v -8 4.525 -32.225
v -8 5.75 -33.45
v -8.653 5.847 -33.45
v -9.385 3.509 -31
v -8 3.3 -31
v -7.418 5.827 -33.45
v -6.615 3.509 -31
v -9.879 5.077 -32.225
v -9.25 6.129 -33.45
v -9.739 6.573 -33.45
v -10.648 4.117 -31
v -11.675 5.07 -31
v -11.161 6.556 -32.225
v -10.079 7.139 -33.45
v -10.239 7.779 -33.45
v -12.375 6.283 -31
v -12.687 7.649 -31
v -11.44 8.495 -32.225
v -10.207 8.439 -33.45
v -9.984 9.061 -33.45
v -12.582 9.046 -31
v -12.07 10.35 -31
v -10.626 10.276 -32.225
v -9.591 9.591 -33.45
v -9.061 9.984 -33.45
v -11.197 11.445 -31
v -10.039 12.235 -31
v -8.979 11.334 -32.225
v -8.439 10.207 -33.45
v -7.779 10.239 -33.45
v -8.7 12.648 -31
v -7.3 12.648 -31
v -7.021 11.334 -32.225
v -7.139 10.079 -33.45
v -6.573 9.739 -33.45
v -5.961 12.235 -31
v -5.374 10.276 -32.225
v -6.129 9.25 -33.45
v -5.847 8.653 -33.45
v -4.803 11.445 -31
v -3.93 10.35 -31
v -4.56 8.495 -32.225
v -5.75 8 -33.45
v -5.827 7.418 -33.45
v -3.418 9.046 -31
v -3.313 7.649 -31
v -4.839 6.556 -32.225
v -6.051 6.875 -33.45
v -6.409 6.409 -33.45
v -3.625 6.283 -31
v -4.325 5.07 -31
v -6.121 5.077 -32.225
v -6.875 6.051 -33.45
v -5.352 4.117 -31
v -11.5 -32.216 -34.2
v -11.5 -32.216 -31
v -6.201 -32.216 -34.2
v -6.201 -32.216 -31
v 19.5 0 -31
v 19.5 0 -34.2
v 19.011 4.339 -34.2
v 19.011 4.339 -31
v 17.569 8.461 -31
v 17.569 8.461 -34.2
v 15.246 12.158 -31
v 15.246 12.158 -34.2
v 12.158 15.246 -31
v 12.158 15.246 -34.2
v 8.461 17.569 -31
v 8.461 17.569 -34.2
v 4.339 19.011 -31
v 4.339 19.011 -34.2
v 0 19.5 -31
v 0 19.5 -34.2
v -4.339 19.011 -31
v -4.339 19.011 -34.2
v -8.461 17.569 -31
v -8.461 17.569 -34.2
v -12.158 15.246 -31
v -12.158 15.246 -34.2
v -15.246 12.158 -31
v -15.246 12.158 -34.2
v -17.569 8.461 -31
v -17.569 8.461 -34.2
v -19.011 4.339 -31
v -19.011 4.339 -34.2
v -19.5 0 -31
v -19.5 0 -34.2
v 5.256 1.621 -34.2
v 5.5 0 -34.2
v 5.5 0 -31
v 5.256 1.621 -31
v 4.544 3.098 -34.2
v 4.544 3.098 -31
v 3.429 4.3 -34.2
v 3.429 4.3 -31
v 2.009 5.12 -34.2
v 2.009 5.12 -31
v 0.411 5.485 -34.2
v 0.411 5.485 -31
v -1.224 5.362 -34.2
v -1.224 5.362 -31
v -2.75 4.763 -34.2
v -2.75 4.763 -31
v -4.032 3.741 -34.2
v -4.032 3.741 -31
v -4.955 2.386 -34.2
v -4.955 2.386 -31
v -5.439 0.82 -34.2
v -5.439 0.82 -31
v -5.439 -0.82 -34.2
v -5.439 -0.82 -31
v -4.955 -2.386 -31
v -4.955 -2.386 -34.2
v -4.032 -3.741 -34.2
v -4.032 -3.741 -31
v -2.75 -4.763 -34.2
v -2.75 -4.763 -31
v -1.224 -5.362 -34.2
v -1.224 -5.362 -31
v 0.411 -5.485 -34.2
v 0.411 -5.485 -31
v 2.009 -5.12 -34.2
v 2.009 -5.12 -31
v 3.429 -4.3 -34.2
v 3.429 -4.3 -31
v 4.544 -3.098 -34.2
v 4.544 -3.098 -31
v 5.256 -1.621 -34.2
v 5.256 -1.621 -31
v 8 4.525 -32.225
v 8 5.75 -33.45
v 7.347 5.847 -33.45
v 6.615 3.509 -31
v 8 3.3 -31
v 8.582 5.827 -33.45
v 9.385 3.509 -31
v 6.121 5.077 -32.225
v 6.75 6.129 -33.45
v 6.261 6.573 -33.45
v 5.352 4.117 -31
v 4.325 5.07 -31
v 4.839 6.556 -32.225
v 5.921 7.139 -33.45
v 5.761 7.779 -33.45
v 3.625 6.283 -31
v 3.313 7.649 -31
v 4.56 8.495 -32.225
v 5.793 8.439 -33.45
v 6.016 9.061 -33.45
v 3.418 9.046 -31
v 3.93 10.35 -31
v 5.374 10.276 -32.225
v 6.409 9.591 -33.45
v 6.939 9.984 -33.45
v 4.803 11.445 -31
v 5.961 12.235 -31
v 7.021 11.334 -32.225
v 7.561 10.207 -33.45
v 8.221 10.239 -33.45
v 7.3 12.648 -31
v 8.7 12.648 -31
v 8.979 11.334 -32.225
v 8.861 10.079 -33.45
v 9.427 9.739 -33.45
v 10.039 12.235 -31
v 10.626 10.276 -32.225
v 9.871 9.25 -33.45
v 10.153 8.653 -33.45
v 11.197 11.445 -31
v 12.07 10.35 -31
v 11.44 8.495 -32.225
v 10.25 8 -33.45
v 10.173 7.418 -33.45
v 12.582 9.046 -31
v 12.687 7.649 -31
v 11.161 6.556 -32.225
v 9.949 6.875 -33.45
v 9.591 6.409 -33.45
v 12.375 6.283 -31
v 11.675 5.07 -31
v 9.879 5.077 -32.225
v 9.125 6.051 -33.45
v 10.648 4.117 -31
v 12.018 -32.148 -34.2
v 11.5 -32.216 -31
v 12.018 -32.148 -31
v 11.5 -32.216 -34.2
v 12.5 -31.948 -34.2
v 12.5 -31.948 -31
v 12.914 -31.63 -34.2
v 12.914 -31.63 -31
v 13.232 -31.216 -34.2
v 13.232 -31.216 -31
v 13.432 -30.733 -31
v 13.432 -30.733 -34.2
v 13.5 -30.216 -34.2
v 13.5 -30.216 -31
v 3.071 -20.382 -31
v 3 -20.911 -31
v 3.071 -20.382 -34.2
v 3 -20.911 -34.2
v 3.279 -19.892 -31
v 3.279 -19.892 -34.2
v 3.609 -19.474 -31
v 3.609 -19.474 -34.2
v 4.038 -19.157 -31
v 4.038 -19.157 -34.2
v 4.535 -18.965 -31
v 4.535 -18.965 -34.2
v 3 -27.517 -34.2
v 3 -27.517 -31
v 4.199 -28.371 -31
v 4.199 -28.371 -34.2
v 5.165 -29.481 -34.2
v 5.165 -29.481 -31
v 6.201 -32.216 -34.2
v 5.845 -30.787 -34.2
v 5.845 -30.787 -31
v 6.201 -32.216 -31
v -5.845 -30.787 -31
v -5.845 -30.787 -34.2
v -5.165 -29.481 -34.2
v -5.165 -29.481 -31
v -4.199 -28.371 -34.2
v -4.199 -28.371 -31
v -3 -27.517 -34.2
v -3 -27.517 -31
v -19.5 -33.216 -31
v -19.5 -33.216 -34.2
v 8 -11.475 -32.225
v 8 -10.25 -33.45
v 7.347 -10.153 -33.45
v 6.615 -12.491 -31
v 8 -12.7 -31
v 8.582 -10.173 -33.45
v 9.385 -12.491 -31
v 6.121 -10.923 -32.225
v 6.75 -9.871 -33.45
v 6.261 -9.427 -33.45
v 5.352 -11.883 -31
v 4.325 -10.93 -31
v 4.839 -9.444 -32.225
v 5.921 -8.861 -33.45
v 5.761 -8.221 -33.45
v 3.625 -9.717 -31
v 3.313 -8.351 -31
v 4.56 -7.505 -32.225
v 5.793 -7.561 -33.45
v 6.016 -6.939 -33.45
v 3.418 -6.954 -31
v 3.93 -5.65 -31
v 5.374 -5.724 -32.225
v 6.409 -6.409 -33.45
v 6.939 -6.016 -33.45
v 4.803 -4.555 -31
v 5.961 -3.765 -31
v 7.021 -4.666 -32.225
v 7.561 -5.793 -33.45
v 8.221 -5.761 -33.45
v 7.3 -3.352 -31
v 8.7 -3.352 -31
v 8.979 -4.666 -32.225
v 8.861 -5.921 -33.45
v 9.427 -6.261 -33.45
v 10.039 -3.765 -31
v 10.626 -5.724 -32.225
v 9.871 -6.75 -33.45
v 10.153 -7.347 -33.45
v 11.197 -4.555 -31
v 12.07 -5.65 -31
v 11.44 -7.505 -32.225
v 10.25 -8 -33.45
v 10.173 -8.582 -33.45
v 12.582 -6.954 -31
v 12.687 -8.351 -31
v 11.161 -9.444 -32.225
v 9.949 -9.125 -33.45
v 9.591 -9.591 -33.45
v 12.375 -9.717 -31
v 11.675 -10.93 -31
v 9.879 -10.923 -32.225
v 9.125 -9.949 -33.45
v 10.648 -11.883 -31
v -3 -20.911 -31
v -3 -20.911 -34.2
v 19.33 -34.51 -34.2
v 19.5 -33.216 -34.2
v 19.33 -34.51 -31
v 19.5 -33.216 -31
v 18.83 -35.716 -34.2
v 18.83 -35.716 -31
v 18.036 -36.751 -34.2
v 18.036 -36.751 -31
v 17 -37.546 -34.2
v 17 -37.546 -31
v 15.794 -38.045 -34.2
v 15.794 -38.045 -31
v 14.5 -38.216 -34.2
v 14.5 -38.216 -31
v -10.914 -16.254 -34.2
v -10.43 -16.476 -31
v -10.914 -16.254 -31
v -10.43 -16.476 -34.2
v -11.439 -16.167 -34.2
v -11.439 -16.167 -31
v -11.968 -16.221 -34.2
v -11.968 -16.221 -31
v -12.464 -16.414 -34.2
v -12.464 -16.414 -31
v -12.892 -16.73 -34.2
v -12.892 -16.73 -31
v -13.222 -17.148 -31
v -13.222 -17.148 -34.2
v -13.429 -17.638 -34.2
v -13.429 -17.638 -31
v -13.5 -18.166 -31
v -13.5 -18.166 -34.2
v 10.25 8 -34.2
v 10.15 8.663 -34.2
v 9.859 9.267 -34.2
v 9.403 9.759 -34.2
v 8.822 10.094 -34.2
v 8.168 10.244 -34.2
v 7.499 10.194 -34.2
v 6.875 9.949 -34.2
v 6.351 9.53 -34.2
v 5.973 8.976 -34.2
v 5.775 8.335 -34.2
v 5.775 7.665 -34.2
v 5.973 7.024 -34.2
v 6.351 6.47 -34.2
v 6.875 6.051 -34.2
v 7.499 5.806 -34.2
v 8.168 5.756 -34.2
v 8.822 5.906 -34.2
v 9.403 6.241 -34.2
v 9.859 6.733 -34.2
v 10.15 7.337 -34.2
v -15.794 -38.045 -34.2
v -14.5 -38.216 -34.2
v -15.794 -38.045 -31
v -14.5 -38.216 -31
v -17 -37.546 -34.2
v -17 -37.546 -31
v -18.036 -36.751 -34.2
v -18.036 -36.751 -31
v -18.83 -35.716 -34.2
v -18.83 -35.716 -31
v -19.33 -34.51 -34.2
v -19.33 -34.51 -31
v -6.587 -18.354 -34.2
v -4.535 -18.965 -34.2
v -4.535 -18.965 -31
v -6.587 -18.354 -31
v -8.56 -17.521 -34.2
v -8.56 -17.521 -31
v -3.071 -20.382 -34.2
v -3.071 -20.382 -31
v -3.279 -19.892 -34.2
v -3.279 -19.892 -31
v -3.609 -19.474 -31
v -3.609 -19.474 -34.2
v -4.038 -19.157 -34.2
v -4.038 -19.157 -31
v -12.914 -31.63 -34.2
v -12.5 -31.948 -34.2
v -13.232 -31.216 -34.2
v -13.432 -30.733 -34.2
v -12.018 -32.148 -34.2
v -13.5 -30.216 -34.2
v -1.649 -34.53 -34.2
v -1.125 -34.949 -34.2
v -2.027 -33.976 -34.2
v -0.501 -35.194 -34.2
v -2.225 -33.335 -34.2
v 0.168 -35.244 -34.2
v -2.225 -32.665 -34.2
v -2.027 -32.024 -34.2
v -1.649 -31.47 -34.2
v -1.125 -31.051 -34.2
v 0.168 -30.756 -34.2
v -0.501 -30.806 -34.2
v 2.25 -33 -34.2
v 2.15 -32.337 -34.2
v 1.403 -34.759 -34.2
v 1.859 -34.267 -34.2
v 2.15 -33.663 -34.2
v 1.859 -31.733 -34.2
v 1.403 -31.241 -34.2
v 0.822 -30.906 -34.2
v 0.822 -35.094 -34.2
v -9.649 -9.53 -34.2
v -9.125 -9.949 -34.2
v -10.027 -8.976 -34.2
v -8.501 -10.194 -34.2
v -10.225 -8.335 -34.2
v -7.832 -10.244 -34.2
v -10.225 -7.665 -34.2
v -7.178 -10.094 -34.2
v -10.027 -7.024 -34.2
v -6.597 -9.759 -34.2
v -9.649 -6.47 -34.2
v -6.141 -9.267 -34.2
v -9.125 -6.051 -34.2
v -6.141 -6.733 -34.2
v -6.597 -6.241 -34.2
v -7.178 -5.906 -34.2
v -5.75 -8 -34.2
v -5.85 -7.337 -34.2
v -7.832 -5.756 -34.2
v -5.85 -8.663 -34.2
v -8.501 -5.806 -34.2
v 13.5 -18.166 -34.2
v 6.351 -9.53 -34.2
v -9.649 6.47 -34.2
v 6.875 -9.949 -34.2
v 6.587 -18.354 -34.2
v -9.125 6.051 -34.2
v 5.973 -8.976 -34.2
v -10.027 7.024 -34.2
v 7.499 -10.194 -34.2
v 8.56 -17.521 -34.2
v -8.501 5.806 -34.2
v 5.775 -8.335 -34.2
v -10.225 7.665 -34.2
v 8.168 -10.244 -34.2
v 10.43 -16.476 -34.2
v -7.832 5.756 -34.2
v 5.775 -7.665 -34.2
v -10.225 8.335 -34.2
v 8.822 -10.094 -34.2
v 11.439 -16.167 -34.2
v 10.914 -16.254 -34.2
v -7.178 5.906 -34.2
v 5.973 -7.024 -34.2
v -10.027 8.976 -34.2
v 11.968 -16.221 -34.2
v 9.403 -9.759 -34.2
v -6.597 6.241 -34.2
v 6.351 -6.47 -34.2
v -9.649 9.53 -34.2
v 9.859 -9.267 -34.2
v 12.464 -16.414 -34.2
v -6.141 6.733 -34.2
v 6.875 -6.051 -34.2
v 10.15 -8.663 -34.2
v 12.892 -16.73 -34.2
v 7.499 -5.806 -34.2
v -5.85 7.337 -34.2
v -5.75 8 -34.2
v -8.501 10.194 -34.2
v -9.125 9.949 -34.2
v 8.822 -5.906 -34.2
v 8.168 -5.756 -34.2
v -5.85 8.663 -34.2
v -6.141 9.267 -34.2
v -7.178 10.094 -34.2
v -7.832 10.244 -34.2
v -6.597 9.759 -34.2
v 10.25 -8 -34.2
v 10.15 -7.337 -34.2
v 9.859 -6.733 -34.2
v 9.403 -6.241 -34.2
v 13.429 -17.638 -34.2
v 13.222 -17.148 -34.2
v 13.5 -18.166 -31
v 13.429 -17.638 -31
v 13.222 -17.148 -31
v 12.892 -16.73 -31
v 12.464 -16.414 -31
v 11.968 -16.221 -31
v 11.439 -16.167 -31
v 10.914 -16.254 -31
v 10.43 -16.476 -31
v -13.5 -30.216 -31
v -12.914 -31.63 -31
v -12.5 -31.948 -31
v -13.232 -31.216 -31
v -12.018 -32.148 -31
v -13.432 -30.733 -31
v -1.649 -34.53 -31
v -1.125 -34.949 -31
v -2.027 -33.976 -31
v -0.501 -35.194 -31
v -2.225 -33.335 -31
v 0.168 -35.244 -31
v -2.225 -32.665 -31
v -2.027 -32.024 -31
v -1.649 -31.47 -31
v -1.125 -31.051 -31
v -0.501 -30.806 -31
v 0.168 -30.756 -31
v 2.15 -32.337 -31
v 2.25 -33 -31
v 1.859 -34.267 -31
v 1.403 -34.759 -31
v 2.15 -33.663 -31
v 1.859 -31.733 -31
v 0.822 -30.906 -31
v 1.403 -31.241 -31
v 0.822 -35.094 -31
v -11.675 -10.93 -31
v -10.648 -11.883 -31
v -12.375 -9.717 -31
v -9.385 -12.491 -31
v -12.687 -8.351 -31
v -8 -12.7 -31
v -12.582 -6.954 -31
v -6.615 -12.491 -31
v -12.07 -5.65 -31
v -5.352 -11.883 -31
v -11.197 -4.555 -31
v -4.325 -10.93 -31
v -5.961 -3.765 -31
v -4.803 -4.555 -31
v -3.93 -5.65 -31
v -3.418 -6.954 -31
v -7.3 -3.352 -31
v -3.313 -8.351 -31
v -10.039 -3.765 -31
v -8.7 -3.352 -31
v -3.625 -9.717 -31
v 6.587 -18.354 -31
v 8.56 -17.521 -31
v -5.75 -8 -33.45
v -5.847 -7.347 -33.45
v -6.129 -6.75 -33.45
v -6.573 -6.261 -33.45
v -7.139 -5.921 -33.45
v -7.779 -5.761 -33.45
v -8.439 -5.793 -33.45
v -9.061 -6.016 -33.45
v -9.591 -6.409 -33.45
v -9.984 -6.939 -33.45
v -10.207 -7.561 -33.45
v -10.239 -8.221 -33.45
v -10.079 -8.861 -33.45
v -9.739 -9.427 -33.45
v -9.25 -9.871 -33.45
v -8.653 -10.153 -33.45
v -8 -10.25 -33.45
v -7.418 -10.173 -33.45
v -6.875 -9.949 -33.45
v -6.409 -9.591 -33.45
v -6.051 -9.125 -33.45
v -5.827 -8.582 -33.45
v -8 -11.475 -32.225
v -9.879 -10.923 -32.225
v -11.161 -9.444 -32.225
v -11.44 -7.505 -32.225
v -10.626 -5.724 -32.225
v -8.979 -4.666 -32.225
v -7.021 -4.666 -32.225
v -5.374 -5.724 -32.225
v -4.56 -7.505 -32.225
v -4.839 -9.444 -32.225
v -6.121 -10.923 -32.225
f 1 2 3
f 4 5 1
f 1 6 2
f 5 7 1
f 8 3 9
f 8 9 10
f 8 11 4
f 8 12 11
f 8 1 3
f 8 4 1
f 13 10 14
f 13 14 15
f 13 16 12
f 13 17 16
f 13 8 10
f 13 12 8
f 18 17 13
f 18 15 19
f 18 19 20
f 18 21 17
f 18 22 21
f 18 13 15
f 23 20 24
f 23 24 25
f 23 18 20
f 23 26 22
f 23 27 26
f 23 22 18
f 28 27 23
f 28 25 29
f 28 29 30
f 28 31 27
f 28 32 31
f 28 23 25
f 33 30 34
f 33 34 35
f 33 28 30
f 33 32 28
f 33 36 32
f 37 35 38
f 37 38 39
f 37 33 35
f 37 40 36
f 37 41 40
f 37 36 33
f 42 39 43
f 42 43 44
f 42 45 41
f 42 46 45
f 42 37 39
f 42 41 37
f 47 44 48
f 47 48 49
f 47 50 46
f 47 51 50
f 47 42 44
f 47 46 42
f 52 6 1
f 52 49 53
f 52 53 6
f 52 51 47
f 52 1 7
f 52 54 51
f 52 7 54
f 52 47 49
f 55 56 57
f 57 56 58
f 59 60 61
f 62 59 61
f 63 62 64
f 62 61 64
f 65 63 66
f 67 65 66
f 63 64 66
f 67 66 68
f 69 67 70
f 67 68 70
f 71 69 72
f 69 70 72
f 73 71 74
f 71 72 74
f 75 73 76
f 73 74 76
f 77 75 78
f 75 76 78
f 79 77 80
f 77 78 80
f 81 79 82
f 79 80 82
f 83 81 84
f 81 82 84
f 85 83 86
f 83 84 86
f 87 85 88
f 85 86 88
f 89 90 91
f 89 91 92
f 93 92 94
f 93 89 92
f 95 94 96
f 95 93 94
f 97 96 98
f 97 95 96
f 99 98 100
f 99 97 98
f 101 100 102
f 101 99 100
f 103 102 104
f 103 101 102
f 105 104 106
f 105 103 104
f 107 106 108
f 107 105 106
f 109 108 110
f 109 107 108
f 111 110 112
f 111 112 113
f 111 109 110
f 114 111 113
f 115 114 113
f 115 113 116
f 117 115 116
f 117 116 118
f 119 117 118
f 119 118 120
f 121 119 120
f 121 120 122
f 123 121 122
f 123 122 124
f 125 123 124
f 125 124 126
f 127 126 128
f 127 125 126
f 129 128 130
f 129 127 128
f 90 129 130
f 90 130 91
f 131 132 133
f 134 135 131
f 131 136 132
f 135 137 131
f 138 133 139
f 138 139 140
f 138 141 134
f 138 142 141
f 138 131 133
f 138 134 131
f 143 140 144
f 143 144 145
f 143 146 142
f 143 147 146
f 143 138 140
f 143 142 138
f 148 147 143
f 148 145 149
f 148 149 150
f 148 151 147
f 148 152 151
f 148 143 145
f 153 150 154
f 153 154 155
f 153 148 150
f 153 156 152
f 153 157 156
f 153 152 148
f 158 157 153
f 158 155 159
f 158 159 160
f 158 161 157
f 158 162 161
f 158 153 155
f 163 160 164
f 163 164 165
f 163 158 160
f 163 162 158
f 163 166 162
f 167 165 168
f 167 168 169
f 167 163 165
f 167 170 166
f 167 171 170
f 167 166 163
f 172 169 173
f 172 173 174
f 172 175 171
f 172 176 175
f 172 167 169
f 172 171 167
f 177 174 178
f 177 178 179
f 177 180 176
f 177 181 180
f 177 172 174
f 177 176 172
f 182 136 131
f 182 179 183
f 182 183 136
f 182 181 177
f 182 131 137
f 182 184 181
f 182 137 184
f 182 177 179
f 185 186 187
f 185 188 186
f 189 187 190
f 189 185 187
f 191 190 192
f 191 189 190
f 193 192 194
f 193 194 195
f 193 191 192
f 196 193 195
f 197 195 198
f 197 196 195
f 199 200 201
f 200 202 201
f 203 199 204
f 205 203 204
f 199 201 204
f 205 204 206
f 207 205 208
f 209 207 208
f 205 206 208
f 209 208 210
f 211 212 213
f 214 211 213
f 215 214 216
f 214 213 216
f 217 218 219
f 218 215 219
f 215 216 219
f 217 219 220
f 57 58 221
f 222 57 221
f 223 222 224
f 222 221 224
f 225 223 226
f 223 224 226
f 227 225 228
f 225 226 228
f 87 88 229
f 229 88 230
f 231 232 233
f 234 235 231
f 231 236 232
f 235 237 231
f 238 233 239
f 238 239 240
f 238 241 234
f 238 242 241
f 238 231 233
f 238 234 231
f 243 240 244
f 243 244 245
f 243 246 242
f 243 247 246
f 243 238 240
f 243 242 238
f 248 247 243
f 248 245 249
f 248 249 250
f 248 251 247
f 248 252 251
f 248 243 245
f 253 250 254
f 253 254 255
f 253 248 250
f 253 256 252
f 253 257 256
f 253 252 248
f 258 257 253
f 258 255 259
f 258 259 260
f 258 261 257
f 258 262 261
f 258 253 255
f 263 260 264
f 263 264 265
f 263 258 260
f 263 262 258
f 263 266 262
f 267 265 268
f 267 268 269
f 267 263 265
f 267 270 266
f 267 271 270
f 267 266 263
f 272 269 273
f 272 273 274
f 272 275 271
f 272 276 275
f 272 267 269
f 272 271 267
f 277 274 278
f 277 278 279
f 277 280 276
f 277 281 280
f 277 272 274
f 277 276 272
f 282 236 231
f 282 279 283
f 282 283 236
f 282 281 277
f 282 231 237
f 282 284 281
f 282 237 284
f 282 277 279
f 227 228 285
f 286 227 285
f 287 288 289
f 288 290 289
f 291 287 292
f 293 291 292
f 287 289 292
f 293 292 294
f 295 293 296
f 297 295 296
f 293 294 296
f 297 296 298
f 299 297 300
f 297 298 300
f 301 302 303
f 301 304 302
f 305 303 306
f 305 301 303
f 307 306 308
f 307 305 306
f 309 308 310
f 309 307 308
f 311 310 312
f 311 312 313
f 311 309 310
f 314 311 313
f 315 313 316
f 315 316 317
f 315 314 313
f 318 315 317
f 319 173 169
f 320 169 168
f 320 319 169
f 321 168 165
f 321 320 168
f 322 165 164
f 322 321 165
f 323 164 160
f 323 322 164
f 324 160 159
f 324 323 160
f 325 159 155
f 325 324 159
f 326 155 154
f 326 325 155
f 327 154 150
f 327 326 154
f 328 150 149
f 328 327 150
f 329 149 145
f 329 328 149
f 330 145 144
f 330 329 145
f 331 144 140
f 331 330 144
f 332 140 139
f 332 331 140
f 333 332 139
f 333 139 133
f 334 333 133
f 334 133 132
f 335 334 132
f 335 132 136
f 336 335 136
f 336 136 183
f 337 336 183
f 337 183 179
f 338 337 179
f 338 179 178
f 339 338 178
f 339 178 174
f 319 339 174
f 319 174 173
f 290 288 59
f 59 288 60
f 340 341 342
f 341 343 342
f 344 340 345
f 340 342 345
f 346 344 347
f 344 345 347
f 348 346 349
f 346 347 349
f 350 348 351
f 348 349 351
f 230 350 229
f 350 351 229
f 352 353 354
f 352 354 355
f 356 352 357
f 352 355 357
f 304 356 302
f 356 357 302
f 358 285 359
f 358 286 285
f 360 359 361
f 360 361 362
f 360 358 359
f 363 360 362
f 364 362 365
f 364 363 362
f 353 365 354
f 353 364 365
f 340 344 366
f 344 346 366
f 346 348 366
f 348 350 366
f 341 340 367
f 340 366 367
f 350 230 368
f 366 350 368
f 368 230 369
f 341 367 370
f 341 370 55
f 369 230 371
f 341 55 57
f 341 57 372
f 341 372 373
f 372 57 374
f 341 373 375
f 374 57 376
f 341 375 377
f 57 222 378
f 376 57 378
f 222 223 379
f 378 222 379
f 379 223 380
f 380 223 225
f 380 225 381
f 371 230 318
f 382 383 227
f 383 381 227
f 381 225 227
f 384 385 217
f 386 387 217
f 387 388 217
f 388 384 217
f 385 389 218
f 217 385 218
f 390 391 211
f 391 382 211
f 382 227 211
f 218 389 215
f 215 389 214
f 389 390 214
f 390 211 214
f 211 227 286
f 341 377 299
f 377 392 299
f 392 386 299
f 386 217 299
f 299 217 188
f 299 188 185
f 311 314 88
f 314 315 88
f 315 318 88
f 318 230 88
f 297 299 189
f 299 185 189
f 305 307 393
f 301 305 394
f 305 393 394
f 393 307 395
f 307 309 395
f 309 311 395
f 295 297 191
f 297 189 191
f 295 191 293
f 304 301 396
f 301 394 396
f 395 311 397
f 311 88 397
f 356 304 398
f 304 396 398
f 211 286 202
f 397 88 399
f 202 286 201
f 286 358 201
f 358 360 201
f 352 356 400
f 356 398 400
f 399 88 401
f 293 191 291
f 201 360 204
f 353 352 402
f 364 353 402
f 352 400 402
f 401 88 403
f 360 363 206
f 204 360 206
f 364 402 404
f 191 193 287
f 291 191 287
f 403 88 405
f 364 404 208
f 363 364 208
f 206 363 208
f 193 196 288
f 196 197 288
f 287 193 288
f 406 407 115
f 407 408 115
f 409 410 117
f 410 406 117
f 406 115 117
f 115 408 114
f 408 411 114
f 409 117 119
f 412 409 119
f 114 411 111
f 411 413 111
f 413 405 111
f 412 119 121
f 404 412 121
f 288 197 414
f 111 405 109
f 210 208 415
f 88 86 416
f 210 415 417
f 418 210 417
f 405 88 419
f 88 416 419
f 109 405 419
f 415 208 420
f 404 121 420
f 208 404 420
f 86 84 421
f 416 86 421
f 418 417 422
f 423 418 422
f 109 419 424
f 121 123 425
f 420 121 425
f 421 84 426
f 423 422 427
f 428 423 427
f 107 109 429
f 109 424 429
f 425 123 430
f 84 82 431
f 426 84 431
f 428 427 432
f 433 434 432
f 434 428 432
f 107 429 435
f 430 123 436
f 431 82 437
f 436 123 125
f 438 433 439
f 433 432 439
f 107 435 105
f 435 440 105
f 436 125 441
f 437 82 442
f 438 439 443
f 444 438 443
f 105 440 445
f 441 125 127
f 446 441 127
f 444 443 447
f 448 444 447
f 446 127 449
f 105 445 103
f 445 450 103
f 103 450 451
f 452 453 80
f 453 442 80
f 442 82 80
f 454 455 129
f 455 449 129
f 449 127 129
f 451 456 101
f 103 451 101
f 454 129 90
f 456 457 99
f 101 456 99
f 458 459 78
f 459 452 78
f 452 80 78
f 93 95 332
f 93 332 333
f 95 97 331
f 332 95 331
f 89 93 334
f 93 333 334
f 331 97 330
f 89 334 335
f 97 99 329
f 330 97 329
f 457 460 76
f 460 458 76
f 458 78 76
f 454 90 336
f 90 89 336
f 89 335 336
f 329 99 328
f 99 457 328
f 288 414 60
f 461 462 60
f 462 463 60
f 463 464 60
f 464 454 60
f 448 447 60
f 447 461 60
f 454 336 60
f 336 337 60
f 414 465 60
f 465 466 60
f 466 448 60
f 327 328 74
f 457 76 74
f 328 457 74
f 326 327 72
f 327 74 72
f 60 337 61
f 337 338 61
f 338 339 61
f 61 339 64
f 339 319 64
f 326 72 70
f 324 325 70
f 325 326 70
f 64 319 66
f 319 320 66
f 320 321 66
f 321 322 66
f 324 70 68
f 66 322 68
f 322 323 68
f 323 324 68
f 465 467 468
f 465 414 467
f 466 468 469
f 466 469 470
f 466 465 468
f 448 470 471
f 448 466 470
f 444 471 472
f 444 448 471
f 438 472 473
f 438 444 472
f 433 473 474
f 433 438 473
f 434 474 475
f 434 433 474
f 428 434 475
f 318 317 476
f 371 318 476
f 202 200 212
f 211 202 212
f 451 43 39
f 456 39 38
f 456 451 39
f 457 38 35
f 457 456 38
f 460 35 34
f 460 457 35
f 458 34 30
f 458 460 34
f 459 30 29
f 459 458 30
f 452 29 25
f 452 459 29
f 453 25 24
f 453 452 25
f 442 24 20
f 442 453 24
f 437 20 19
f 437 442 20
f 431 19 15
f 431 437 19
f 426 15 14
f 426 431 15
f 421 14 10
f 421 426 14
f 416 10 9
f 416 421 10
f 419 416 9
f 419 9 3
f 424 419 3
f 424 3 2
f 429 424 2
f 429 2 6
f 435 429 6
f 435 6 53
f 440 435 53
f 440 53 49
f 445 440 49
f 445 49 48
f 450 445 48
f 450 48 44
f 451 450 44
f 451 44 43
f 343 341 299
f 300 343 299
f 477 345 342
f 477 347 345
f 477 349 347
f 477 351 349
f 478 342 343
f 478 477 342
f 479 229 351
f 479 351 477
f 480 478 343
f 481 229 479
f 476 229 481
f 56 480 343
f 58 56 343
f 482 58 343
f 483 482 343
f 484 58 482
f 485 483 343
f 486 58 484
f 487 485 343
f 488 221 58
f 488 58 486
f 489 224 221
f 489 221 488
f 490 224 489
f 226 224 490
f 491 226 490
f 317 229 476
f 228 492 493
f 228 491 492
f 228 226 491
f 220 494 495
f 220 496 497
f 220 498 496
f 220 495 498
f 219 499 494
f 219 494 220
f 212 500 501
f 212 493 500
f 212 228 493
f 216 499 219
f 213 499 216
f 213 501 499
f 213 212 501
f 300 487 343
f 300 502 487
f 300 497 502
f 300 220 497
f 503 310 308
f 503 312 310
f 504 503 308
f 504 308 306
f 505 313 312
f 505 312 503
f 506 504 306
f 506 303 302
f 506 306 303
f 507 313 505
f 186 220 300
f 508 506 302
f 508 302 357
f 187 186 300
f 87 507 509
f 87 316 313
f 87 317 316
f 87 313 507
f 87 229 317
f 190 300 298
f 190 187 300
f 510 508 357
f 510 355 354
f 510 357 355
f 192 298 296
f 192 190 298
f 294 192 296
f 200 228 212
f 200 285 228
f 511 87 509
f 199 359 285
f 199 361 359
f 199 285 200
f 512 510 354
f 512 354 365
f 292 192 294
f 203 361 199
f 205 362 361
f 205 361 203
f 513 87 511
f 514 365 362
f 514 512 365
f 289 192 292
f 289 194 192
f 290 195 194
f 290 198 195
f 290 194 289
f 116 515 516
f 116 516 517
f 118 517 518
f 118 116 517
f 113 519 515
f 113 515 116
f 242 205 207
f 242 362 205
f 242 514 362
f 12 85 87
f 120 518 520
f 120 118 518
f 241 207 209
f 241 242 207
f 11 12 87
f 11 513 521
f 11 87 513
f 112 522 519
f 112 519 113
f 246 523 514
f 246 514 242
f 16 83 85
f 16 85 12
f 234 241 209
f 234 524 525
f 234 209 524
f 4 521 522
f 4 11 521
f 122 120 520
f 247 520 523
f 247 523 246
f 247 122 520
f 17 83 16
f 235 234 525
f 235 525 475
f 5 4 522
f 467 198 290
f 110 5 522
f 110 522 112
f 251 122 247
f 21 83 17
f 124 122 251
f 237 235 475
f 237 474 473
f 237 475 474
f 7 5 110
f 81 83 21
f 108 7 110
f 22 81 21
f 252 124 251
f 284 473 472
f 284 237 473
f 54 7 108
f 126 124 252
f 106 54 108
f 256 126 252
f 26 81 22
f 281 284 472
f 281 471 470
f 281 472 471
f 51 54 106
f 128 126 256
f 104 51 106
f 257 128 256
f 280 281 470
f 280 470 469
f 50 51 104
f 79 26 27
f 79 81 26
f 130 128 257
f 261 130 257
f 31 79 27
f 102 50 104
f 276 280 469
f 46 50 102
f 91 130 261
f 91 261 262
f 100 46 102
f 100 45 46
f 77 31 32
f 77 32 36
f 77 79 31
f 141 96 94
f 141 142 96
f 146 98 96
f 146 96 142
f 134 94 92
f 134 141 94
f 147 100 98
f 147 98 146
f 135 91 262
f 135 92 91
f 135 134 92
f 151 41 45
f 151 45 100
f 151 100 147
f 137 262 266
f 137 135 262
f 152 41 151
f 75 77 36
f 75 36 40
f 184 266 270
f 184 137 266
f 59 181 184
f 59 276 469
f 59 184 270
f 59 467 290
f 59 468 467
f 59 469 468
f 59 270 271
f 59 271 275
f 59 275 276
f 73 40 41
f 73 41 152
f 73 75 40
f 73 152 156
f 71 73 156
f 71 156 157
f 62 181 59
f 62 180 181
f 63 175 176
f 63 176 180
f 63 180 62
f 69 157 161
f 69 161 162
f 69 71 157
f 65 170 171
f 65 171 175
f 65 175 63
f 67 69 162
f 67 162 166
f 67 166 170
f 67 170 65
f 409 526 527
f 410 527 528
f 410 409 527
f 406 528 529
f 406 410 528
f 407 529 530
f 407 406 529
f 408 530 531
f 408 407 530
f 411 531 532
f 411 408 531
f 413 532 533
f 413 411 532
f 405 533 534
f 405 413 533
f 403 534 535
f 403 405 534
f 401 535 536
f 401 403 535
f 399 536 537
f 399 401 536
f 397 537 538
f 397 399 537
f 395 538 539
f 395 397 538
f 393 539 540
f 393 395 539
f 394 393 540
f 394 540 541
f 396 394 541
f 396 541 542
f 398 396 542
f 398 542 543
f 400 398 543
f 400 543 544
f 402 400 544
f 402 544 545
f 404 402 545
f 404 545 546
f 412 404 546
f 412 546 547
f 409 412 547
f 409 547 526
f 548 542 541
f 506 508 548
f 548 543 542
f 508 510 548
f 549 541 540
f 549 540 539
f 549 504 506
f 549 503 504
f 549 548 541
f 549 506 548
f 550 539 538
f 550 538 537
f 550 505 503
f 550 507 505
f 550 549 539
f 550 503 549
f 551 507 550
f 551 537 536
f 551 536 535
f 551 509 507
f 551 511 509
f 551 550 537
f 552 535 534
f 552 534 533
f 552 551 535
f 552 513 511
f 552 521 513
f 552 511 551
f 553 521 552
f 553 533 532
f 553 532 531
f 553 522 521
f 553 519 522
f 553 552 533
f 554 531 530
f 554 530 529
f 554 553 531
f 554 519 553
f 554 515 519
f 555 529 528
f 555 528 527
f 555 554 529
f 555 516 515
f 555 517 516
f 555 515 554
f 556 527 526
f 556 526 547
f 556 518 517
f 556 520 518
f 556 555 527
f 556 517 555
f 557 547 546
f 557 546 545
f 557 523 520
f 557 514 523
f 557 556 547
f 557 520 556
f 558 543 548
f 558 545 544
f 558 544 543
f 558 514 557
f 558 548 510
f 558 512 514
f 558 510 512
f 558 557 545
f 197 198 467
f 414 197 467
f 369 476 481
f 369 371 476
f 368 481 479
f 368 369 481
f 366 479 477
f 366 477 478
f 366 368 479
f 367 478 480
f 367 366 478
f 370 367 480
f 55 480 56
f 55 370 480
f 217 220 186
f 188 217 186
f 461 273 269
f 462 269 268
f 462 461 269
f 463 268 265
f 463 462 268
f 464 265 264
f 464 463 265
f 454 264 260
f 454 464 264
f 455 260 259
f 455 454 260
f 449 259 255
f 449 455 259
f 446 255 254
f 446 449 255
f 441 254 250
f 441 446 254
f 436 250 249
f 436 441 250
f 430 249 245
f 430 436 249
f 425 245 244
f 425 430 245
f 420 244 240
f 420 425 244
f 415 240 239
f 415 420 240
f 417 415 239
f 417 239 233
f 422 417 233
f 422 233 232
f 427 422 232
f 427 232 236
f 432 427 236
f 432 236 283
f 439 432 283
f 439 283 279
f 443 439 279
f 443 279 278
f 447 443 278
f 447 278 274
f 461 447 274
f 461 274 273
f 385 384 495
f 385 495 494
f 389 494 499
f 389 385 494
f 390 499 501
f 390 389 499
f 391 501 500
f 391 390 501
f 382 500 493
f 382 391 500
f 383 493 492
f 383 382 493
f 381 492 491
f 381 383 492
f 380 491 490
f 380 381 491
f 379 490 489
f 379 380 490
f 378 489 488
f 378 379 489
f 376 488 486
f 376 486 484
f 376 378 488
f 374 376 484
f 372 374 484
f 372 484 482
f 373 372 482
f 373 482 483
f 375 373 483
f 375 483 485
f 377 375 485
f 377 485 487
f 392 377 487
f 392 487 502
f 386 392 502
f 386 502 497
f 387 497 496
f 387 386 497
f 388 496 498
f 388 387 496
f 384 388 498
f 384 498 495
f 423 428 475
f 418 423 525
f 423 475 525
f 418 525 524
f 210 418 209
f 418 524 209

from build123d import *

# Parameters (mm, degrees)
STOCK_SPINE_MASTER_1_START                   = -34.2
STOCK_SPINE_MASTER_1_OUTLINE_R               = 2.25
STOCK_SPINE_MASTER_1_OUTLINE_R_2             = 5.5
STOCK_SPINE_MASTER_1_DEPTH                   = 3.2
FILLET1_R                                    = 5
CUT_EXTRUDE2_DEPTH                           = 44.022458369
FILLET2_R                                    = 2
CSK_FOR_M4_COUNTERSUNK_FLAT_HEAD_SCR_2_COUNT = 2
CSK_FOR_M4_COUNTERSUNK_FLAT_HEAD_SCR_2_PITCH = 16
CSK_FOR_M4_COUNTERSUNK_FLAT_HEAD_SCR_3_COUNT = 2
CSK_FOR_M4_COUNTERSUNK_FLAT_HEAD_SCR_3_PITCH = 22.627416998
CSK_FOR_M4_COUNTERSUNK_FLAT_HEAD_SCR_4_COUNT = 2
CSK_FOR_M4_COUNTERSUNK_FLAT_HEAD_SCR_4_PITCH = 16


# Read off the part's stored shape, not the designer's step: Stock-spine_master-1
with BuildPart() as part:
    # Stock-spine_master-1 outline → Stock-spine_master-1 (new body)
    with BuildSketch(Plane.XY.offset(STOCK_SPINE_MASTER_1_START)):
        with BuildLine():
            Line((19.5, -38.215728753), (19.5, 0))
            ThreePointArc((19.5, 0), (0, 19.5), (-19.5, 0))
            Line((-19.5, 0), (-19.5, -38.215728753))
            Line((-19.5, -38.215728753), (19.5, -38.215728753))
        make_face()
        with Locations((0, -33)):
            Circle(STOCK_SPINE_MASTER_1_OUTLINE_R, mode=Mode.SUBTRACT)
        with Locations((-8, -8)):
            Circle(STOCK_SPINE_MASTER_1_OUTLINE_R, mode=Mode.SUBTRACT)
        with Locations((-8, 8)):
            Circle(STOCK_SPINE_MASTER_1_OUTLINE_R, mode=Mode.SUBTRACT)
        with Locations((8, -8)):
            Circle(STOCK_SPINE_MASTER_1_OUTLINE_R, mode=Mode.SUBTRACT)
        Circle(STOCK_SPINE_MASTER_1_OUTLINE_R_2, mode=Mode.SUBTRACT)
        with Locations((8, 8)):
            Circle(STOCK_SPINE_MASTER_1_OUTLINE_R, mode=Mode.SUBTRACT)
    extrude(amount=STOCK_SPINE_MASTER_1_DEPTH)

    # Fillet1
    fillet1_edges = [part.edges().sort_by_distance(p)[0] for p in [
        (-19.5, -38.215728753, -32.6),
        (19.5, -38.215728753, -32.6),
    ]]
    fillet(fillet1_edges, radius=FILLET1_R)

    # Sketch1 → Cut-Extrude2 (cut, through all)
    with BuildSketch(Plane.XY.offset(-31)):
        with BuildLine():
            ThreePointArc((13.5, -14.071247279), (8.649489408, -17.476736909), (3, -19.267848868))
            Line((3, -19.267848868), (3, -27.51707195))
            ThreePointArc((3, -27.51707195), (5.165471514, -29.481420167), (6.200598246, -32.215728753))
            Line((6.200598246, -32.215728753), (6.25, -32.215728753))
            Line((6.25, -32.215728753), (13.5, -32.215728753))
            Line((13.5, -32.215728753), (13.5, -14.071247279))
        make_face()
        with BuildLine():
            Line((-3, -27.51707195), (-3, -19.267848868))
            ThreePointArc((-3, -19.267848868), (-8.649489408, -17.476736909), (-13.5, -14.071247279))
            Line((-13.5, -14.071247279), (-13.5, -32.215728753))
            Line((-13.5, -32.215728753), (-6.25, -32.215728753))
            Line((-6.25, -32.215728753), (-6.200598246, -32.215728753))
            ThreePointArc((-6.200598246, -32.215728753), (-5.165471514, -29.481420167), (-3, -27.51707195))
        make_face()
    extrude(amount=-CUT_EXTRUDE2_DEPTH, mode=Mode.SUBTRACT)

    # Fillet2
    fillet2_edges = [part.edges().sort_by_distance(p)[0] for p in [
        (3, -19.267848868, -32.6),
        (13.5, -14.071247279, -32.6),
        (13.5, -32.215728753, -32.6),
        (-13.5, -14.071247279, -32.6),
        (-3, -19.267848868, -32.6),
        (-13.5, -32.215728753, -32.6),
    ]]
    fillet(fillet2_edges, radius=FILLET2_R)

    # Sketch4 → CSK for M4 Countersunk Flat Head Screw1 (revolve, cut)
    with BuildSketch(Plane(origin=(-8, -8, -31), x_dir=(0, -1, 0), z_dir=(1, 0, 0))):
        Polygon((0, 0), (0, 3.2), (2.25, 3.2), (2.25, 2.45), (4.7, 0), align=None)
    csk_for_m4_countersunk_flat_head_screw1 = revolve(axis=Axis((-8, -8, -24.65), (0, 0, -1)), mode=Mode.SUBTRACT)

    # CSK for M4 Countersunk Flat Head Scr 2: CSK for M4 Countersunk Flat Head Screw1 ×2
    with Locations(*[(i * CSK_FOR_M4_COUNTERSUNK_FLAT_HEAD_SCR_2_PITCH, 0, 0) for i in range(1, CSK_FOR_M4_COUNTERSUNK_FLAT_HEAD_SCR_2_COUNT)]):
        add(csk_for_m4_countersunk_flat_head_screw1, mode=Mode.SUBTRACT)

    # CSK for M4 Countersunk Flat Head Scr 3: CSK for M4 Countersunk Flat Head Screw1 ×2
    with Locations(*[Vector(0.7071067811865426, 0.7071067811865526, 0) * (i * CSK_FOR_M4_COUNTERSUNK_FLAT_HEAD_SCR_3_PITCH) for i in range(1, CSK_FOR_M4_COUNTERSUNK_FLAT_HEAD_SCR_3_COUNT)]):
        add(csk_for_m4_countersunk_flat_head_screw1, mode=Mode.SUBTRACT)

    # CSK for M4 Countersunk Flat Head Scr 4: CSK for M4 Countersunk Flat Head Screw1 ×2
    with Locations(*[(0, i * CSK_FOR_M4_COUNTERSUNK_FLAT_HEAD_SCR_4_PITCH, 0) for i in range(1, CSK_FOR_M4_COUNTERSUNK_FLAT_HEAD_SCR_4_COUNT)]):
        add(csk_for_m4_countersunk_flat_head_screw1, mode=Mode.SUBTRACT)


solid = part.part
